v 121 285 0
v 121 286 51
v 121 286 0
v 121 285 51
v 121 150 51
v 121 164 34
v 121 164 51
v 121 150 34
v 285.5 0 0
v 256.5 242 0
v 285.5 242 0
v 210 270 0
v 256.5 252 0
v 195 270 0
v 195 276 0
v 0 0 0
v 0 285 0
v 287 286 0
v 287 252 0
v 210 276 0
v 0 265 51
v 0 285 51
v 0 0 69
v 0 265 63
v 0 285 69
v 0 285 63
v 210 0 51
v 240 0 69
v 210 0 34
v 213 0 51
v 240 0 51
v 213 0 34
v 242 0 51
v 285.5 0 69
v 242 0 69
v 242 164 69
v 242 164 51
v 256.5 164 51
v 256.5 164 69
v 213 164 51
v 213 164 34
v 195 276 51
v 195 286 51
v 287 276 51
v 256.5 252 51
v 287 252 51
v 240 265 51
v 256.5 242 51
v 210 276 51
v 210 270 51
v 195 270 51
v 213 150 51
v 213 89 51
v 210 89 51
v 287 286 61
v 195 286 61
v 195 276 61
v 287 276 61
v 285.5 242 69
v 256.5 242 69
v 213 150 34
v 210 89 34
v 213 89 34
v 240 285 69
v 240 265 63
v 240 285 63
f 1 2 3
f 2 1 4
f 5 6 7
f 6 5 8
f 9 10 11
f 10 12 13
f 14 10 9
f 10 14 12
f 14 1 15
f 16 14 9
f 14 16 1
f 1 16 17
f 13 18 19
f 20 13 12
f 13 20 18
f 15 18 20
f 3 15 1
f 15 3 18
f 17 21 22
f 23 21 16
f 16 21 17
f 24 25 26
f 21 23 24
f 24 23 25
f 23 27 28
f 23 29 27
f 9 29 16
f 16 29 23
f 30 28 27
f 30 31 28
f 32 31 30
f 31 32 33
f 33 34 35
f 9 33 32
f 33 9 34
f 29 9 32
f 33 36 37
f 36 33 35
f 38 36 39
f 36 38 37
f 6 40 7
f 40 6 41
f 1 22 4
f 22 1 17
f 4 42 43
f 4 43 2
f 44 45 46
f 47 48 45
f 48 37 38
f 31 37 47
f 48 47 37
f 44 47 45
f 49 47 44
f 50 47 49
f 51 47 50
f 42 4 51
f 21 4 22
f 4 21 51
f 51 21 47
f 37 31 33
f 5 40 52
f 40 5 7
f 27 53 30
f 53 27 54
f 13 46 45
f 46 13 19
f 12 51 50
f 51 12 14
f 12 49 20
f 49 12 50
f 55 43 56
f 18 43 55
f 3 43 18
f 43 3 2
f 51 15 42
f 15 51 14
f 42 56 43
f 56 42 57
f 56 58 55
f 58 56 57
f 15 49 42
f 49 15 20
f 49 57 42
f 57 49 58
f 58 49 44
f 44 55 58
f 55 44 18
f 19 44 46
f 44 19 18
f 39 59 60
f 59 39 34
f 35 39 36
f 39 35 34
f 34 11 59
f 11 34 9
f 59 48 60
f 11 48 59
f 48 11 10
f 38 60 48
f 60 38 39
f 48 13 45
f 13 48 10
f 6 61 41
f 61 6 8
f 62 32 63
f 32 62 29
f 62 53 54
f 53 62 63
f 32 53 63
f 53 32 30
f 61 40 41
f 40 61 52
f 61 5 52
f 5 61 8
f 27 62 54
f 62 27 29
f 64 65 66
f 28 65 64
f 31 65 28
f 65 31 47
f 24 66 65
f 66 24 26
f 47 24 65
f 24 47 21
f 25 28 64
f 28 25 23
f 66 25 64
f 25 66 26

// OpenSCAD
module box() { cube([287,287,69]); };


// Thin bottom
lIngredientX = 121;
lIngredientY = 164;
lIngredientZ = 17;
echo(str("large ingredient boxes x:",lIngredientX," y:",lIngredientY," z:",lIngredientZ));
module lIndgredientBox() { cube([lIngredientX,lIngredientY,lIngredientZ]); };


// Thin bottom
sIngredientX = 121;
sIngredientY = 121;
sIngredientZ = 17;
echo(str("small ingredient boxes x:",sIngredientX," y:",sIngredientY," z:",sIngredientZ));
module sIndgredientBox() { cube([sIngredientX,sIngredientY,sIngredientZ]); };

boardsX = 240;
boardsY = 265;
boardsZ = 12;
echo(str("boards x:",boardsX," y:",boardsY," z:",boardsZ));
module boards() { cube([boardsX,boardsY,boardsZ]); };

boards2X = 240;
boards2Y = 285;
boards2Z = 6;
echo(str("boards2 x:",boards2X," y:",boards2Y," z:",boards2Z));
module boards2() { cube([boards2X,boards2Y,boards2Z]); };

// Thin bottom
fortuneCardsX = 61;
fortuneCardsY = 92;
fortuneCardsZ = 17;
echo(str("fortune cards x:",fortuneCardsX," y:",fortuneCardsY," z:",fortuneCardsZ));
module fortuneCards() { cube([fortuneCardsX,fortuneCardsY,fortuneCardsZ]); };

// Thin bottom
essenceCardsX = 61;
essenceCardsY = 92;
essenceCardsZ = 10;
echo(str("essence cards x:",essenceCardsX," y:",essenceCardsY," z:",essenceCardsZ));
module essenceCards() { cube([essenceCardsX,essenceCardsY,essenceCardsZ]); };

rubiesX = lIngredientZ*3;
rubiesY = 89;
rubiesZ = 18;
echo(str("rubies x:",rubiesX," y:",rubiesY," z:",rubiesZ));
module rubies() { cube([rubiesX,rubiesY,rubiesZ]); };

overflowX = 89;
overflowY = 89;
overflowZ = sIngredientZ;
echo(str("overflow x:",overflowX," y:",overflowY," z:",overflowZ));
module overflow() { cube([overflowX,overflowY,overflowZ]); };

// Thin bottom, 1.5 mm lid
playerX = lIngredientX;
playerY = 69;
playerZ = 14.5;
echo(str("player x:",playerX," y:",playerY," z:",playerZ));
module player() { cube([playerX,playerY,playerZ]); };

// Thin bottom
witchesX = lIngredientX + playerZ;
witchesY = 88;
witchesZ = 30;
echo(str("witches x:",witchesX," y:",witchesY," z:",witchesZ));
module witches() { cube([witchesX,witchesY,witchesZ]); };

// Thin bottom
patientChartX = lIngredientX + playerZ;;
patientChartY = 84 + 4;
patientChartZ = 18 + 3;
echo(str("patient charts x:",patientChartX," y:",patientChartY," z:",patientChartZ));
module charts() { cube([patientChartX,patientChartY,patientChartZ]); };

penniesX = lIngredientZ*3;
penniesY = 74;
penniesZ = 16;
echo(str("pennies x:",penniesX," y:",penniesY," z:",penniesZ));
module pennies() { cube([penniesX,penniesY,penniesZ]); };

alchemistX = lIngredientZ*3;
alchemistY = 287 - sIngredientY - rubiesY;
alchemistZ = rubiesZ + penniesZ-essenceCardsZ;
echo(str("alchemist x:",alchemistX," y:",alchemistY," z:",alchemistZ));
module alchemist() { cube([alchemistX,alchemistY,alchemistZ]); };

cherryBX = playerZ;
cherryBY = lIngredientY - playerX;
cherryBZ = playerY;
echo(str("cherry bombs x:",cherryBX," y:",cherryBY," z:",cherryBZ));
module cherryB() { cube([cherryBX,cherryBY,cherryBZ]); };

spacerX = lIngredientX - fortuneCardsY;
spacerY = lIngredientY;
spacerZ = fortuneCardsZ;
echo(str("spacer x:",spacerX," y:",spacerY," z:",spacerZ));
module spacer() { cube([spacerX,spacerY,spacerZ]); };

layer1 = true;
layer2 = true;
layer3 = true;
layer4 = true;

//color("red",0.10) box();

if (layer1) {
    color("Red") lIndgredientBox();
    translate([lIngredientX,0,0]) color("DarkOrange") lIndgredientBox();
    translate([sIngredientY,lIngredientY,0]) rotate([0,0,90]) color("black") sIndgredientBox();
    translate([lIngredientX,lIngredientY+patientChartY+rubiesZ,rubiesX]) rotate([90,90,0]) color("Crimson") rubies();
    translate([lIngredientX,lIngredientY+patientChartY+rubiesZ+penniesZ,rubiesX]) rotate([90,90,0]) color("Maroon") pennies();
    translate([lIngredientX+penniesY,lIngredientY+patientChartY+rubiesZ+penniesZ,essenceCardsX]) rotate([90,90,0]) color("Purple") essenceCards();
    translate([lIngredientX+rubiesY,lIngredientY+patientChartY+rubiesZ+penniesZ-essenceCardsZ,alchemistX]) rotate([90,90,0]) color("White") alchemist();
    //translate([lIngredientX + witchesX,lIngredientY,cardsX]) rotate([0,90,0]) color("white") cards();
    translate([lIngredientX*2,0,0]) rotate([90,0,90]) color("SpringGreen") player();
    translate([lIngredientX*2+playerZ,0,0]) rotate([90,0,90]) color("SteelBlue") player();
    translate([lIngredientX*2+playerZ*2,0,0]) rotate([90,0,90]) color("Yellow") player();
    translate([lIngredientX*2+playerZ*2,playerX,0]) rotate([90,0,90]) color("Red") player();
    translate([lIngredientX*2+playerZ,playerX,0]) rotate([90,0,90]) color("Black") player();
    translate([lIngredientX,lIngredientY,0]) color("Cyan") charts();
    translate([2*lIngredientX,playerX,0]) color("Grey") cherryB();
}  
if (layer2) {  
    translate([0,0,lIngredientZ]) color("green") lIndgredientBox();
    translate([lIngredientX,0,lIngredientZ]) color("Yellow") lIndgredientBox();
    translate([sIngredientY,lIngredientY,lIngredientZ]) rotate([0,0,90]) color("HotPink") sIndgredientBox();
    translate([lIngredientX,lIngredientY,patientChartZ]) color("YellowGreen") witches();
}
if (layer3) {
    translate([0,0,lIngredientZ*2]) color("blue") lIndgredientBox();
    translate([sIngredientY,lIngredientY,lIngredientZ*2]) rotate([0,0,90]) color("purple") sIndgredientBox();
    translate([lIngredientX+fortuneCardsY,overflowY,lIngredientZ*2]) rotate([0,0,90]) color("white") fortuneCards();
    //translate([lIngredientX+cardsX,0,lIngredientZ*2]) color("Crimson") rubies();
    translate([lIngredientX,0,lIngredientZ*2]) color("Gold") overflow();
    translate([lIngredientX+fortuneCardsY,0,lIngredientZ*2]) color("Pink") spacer();
}

if (layer4) {
    translate([0,0,lIngredientZ*3]) color("grey") boards();
    translate([0,0,lIngredientZ*3+boardsZ]) color("LightSlateGray") boards2();
}
